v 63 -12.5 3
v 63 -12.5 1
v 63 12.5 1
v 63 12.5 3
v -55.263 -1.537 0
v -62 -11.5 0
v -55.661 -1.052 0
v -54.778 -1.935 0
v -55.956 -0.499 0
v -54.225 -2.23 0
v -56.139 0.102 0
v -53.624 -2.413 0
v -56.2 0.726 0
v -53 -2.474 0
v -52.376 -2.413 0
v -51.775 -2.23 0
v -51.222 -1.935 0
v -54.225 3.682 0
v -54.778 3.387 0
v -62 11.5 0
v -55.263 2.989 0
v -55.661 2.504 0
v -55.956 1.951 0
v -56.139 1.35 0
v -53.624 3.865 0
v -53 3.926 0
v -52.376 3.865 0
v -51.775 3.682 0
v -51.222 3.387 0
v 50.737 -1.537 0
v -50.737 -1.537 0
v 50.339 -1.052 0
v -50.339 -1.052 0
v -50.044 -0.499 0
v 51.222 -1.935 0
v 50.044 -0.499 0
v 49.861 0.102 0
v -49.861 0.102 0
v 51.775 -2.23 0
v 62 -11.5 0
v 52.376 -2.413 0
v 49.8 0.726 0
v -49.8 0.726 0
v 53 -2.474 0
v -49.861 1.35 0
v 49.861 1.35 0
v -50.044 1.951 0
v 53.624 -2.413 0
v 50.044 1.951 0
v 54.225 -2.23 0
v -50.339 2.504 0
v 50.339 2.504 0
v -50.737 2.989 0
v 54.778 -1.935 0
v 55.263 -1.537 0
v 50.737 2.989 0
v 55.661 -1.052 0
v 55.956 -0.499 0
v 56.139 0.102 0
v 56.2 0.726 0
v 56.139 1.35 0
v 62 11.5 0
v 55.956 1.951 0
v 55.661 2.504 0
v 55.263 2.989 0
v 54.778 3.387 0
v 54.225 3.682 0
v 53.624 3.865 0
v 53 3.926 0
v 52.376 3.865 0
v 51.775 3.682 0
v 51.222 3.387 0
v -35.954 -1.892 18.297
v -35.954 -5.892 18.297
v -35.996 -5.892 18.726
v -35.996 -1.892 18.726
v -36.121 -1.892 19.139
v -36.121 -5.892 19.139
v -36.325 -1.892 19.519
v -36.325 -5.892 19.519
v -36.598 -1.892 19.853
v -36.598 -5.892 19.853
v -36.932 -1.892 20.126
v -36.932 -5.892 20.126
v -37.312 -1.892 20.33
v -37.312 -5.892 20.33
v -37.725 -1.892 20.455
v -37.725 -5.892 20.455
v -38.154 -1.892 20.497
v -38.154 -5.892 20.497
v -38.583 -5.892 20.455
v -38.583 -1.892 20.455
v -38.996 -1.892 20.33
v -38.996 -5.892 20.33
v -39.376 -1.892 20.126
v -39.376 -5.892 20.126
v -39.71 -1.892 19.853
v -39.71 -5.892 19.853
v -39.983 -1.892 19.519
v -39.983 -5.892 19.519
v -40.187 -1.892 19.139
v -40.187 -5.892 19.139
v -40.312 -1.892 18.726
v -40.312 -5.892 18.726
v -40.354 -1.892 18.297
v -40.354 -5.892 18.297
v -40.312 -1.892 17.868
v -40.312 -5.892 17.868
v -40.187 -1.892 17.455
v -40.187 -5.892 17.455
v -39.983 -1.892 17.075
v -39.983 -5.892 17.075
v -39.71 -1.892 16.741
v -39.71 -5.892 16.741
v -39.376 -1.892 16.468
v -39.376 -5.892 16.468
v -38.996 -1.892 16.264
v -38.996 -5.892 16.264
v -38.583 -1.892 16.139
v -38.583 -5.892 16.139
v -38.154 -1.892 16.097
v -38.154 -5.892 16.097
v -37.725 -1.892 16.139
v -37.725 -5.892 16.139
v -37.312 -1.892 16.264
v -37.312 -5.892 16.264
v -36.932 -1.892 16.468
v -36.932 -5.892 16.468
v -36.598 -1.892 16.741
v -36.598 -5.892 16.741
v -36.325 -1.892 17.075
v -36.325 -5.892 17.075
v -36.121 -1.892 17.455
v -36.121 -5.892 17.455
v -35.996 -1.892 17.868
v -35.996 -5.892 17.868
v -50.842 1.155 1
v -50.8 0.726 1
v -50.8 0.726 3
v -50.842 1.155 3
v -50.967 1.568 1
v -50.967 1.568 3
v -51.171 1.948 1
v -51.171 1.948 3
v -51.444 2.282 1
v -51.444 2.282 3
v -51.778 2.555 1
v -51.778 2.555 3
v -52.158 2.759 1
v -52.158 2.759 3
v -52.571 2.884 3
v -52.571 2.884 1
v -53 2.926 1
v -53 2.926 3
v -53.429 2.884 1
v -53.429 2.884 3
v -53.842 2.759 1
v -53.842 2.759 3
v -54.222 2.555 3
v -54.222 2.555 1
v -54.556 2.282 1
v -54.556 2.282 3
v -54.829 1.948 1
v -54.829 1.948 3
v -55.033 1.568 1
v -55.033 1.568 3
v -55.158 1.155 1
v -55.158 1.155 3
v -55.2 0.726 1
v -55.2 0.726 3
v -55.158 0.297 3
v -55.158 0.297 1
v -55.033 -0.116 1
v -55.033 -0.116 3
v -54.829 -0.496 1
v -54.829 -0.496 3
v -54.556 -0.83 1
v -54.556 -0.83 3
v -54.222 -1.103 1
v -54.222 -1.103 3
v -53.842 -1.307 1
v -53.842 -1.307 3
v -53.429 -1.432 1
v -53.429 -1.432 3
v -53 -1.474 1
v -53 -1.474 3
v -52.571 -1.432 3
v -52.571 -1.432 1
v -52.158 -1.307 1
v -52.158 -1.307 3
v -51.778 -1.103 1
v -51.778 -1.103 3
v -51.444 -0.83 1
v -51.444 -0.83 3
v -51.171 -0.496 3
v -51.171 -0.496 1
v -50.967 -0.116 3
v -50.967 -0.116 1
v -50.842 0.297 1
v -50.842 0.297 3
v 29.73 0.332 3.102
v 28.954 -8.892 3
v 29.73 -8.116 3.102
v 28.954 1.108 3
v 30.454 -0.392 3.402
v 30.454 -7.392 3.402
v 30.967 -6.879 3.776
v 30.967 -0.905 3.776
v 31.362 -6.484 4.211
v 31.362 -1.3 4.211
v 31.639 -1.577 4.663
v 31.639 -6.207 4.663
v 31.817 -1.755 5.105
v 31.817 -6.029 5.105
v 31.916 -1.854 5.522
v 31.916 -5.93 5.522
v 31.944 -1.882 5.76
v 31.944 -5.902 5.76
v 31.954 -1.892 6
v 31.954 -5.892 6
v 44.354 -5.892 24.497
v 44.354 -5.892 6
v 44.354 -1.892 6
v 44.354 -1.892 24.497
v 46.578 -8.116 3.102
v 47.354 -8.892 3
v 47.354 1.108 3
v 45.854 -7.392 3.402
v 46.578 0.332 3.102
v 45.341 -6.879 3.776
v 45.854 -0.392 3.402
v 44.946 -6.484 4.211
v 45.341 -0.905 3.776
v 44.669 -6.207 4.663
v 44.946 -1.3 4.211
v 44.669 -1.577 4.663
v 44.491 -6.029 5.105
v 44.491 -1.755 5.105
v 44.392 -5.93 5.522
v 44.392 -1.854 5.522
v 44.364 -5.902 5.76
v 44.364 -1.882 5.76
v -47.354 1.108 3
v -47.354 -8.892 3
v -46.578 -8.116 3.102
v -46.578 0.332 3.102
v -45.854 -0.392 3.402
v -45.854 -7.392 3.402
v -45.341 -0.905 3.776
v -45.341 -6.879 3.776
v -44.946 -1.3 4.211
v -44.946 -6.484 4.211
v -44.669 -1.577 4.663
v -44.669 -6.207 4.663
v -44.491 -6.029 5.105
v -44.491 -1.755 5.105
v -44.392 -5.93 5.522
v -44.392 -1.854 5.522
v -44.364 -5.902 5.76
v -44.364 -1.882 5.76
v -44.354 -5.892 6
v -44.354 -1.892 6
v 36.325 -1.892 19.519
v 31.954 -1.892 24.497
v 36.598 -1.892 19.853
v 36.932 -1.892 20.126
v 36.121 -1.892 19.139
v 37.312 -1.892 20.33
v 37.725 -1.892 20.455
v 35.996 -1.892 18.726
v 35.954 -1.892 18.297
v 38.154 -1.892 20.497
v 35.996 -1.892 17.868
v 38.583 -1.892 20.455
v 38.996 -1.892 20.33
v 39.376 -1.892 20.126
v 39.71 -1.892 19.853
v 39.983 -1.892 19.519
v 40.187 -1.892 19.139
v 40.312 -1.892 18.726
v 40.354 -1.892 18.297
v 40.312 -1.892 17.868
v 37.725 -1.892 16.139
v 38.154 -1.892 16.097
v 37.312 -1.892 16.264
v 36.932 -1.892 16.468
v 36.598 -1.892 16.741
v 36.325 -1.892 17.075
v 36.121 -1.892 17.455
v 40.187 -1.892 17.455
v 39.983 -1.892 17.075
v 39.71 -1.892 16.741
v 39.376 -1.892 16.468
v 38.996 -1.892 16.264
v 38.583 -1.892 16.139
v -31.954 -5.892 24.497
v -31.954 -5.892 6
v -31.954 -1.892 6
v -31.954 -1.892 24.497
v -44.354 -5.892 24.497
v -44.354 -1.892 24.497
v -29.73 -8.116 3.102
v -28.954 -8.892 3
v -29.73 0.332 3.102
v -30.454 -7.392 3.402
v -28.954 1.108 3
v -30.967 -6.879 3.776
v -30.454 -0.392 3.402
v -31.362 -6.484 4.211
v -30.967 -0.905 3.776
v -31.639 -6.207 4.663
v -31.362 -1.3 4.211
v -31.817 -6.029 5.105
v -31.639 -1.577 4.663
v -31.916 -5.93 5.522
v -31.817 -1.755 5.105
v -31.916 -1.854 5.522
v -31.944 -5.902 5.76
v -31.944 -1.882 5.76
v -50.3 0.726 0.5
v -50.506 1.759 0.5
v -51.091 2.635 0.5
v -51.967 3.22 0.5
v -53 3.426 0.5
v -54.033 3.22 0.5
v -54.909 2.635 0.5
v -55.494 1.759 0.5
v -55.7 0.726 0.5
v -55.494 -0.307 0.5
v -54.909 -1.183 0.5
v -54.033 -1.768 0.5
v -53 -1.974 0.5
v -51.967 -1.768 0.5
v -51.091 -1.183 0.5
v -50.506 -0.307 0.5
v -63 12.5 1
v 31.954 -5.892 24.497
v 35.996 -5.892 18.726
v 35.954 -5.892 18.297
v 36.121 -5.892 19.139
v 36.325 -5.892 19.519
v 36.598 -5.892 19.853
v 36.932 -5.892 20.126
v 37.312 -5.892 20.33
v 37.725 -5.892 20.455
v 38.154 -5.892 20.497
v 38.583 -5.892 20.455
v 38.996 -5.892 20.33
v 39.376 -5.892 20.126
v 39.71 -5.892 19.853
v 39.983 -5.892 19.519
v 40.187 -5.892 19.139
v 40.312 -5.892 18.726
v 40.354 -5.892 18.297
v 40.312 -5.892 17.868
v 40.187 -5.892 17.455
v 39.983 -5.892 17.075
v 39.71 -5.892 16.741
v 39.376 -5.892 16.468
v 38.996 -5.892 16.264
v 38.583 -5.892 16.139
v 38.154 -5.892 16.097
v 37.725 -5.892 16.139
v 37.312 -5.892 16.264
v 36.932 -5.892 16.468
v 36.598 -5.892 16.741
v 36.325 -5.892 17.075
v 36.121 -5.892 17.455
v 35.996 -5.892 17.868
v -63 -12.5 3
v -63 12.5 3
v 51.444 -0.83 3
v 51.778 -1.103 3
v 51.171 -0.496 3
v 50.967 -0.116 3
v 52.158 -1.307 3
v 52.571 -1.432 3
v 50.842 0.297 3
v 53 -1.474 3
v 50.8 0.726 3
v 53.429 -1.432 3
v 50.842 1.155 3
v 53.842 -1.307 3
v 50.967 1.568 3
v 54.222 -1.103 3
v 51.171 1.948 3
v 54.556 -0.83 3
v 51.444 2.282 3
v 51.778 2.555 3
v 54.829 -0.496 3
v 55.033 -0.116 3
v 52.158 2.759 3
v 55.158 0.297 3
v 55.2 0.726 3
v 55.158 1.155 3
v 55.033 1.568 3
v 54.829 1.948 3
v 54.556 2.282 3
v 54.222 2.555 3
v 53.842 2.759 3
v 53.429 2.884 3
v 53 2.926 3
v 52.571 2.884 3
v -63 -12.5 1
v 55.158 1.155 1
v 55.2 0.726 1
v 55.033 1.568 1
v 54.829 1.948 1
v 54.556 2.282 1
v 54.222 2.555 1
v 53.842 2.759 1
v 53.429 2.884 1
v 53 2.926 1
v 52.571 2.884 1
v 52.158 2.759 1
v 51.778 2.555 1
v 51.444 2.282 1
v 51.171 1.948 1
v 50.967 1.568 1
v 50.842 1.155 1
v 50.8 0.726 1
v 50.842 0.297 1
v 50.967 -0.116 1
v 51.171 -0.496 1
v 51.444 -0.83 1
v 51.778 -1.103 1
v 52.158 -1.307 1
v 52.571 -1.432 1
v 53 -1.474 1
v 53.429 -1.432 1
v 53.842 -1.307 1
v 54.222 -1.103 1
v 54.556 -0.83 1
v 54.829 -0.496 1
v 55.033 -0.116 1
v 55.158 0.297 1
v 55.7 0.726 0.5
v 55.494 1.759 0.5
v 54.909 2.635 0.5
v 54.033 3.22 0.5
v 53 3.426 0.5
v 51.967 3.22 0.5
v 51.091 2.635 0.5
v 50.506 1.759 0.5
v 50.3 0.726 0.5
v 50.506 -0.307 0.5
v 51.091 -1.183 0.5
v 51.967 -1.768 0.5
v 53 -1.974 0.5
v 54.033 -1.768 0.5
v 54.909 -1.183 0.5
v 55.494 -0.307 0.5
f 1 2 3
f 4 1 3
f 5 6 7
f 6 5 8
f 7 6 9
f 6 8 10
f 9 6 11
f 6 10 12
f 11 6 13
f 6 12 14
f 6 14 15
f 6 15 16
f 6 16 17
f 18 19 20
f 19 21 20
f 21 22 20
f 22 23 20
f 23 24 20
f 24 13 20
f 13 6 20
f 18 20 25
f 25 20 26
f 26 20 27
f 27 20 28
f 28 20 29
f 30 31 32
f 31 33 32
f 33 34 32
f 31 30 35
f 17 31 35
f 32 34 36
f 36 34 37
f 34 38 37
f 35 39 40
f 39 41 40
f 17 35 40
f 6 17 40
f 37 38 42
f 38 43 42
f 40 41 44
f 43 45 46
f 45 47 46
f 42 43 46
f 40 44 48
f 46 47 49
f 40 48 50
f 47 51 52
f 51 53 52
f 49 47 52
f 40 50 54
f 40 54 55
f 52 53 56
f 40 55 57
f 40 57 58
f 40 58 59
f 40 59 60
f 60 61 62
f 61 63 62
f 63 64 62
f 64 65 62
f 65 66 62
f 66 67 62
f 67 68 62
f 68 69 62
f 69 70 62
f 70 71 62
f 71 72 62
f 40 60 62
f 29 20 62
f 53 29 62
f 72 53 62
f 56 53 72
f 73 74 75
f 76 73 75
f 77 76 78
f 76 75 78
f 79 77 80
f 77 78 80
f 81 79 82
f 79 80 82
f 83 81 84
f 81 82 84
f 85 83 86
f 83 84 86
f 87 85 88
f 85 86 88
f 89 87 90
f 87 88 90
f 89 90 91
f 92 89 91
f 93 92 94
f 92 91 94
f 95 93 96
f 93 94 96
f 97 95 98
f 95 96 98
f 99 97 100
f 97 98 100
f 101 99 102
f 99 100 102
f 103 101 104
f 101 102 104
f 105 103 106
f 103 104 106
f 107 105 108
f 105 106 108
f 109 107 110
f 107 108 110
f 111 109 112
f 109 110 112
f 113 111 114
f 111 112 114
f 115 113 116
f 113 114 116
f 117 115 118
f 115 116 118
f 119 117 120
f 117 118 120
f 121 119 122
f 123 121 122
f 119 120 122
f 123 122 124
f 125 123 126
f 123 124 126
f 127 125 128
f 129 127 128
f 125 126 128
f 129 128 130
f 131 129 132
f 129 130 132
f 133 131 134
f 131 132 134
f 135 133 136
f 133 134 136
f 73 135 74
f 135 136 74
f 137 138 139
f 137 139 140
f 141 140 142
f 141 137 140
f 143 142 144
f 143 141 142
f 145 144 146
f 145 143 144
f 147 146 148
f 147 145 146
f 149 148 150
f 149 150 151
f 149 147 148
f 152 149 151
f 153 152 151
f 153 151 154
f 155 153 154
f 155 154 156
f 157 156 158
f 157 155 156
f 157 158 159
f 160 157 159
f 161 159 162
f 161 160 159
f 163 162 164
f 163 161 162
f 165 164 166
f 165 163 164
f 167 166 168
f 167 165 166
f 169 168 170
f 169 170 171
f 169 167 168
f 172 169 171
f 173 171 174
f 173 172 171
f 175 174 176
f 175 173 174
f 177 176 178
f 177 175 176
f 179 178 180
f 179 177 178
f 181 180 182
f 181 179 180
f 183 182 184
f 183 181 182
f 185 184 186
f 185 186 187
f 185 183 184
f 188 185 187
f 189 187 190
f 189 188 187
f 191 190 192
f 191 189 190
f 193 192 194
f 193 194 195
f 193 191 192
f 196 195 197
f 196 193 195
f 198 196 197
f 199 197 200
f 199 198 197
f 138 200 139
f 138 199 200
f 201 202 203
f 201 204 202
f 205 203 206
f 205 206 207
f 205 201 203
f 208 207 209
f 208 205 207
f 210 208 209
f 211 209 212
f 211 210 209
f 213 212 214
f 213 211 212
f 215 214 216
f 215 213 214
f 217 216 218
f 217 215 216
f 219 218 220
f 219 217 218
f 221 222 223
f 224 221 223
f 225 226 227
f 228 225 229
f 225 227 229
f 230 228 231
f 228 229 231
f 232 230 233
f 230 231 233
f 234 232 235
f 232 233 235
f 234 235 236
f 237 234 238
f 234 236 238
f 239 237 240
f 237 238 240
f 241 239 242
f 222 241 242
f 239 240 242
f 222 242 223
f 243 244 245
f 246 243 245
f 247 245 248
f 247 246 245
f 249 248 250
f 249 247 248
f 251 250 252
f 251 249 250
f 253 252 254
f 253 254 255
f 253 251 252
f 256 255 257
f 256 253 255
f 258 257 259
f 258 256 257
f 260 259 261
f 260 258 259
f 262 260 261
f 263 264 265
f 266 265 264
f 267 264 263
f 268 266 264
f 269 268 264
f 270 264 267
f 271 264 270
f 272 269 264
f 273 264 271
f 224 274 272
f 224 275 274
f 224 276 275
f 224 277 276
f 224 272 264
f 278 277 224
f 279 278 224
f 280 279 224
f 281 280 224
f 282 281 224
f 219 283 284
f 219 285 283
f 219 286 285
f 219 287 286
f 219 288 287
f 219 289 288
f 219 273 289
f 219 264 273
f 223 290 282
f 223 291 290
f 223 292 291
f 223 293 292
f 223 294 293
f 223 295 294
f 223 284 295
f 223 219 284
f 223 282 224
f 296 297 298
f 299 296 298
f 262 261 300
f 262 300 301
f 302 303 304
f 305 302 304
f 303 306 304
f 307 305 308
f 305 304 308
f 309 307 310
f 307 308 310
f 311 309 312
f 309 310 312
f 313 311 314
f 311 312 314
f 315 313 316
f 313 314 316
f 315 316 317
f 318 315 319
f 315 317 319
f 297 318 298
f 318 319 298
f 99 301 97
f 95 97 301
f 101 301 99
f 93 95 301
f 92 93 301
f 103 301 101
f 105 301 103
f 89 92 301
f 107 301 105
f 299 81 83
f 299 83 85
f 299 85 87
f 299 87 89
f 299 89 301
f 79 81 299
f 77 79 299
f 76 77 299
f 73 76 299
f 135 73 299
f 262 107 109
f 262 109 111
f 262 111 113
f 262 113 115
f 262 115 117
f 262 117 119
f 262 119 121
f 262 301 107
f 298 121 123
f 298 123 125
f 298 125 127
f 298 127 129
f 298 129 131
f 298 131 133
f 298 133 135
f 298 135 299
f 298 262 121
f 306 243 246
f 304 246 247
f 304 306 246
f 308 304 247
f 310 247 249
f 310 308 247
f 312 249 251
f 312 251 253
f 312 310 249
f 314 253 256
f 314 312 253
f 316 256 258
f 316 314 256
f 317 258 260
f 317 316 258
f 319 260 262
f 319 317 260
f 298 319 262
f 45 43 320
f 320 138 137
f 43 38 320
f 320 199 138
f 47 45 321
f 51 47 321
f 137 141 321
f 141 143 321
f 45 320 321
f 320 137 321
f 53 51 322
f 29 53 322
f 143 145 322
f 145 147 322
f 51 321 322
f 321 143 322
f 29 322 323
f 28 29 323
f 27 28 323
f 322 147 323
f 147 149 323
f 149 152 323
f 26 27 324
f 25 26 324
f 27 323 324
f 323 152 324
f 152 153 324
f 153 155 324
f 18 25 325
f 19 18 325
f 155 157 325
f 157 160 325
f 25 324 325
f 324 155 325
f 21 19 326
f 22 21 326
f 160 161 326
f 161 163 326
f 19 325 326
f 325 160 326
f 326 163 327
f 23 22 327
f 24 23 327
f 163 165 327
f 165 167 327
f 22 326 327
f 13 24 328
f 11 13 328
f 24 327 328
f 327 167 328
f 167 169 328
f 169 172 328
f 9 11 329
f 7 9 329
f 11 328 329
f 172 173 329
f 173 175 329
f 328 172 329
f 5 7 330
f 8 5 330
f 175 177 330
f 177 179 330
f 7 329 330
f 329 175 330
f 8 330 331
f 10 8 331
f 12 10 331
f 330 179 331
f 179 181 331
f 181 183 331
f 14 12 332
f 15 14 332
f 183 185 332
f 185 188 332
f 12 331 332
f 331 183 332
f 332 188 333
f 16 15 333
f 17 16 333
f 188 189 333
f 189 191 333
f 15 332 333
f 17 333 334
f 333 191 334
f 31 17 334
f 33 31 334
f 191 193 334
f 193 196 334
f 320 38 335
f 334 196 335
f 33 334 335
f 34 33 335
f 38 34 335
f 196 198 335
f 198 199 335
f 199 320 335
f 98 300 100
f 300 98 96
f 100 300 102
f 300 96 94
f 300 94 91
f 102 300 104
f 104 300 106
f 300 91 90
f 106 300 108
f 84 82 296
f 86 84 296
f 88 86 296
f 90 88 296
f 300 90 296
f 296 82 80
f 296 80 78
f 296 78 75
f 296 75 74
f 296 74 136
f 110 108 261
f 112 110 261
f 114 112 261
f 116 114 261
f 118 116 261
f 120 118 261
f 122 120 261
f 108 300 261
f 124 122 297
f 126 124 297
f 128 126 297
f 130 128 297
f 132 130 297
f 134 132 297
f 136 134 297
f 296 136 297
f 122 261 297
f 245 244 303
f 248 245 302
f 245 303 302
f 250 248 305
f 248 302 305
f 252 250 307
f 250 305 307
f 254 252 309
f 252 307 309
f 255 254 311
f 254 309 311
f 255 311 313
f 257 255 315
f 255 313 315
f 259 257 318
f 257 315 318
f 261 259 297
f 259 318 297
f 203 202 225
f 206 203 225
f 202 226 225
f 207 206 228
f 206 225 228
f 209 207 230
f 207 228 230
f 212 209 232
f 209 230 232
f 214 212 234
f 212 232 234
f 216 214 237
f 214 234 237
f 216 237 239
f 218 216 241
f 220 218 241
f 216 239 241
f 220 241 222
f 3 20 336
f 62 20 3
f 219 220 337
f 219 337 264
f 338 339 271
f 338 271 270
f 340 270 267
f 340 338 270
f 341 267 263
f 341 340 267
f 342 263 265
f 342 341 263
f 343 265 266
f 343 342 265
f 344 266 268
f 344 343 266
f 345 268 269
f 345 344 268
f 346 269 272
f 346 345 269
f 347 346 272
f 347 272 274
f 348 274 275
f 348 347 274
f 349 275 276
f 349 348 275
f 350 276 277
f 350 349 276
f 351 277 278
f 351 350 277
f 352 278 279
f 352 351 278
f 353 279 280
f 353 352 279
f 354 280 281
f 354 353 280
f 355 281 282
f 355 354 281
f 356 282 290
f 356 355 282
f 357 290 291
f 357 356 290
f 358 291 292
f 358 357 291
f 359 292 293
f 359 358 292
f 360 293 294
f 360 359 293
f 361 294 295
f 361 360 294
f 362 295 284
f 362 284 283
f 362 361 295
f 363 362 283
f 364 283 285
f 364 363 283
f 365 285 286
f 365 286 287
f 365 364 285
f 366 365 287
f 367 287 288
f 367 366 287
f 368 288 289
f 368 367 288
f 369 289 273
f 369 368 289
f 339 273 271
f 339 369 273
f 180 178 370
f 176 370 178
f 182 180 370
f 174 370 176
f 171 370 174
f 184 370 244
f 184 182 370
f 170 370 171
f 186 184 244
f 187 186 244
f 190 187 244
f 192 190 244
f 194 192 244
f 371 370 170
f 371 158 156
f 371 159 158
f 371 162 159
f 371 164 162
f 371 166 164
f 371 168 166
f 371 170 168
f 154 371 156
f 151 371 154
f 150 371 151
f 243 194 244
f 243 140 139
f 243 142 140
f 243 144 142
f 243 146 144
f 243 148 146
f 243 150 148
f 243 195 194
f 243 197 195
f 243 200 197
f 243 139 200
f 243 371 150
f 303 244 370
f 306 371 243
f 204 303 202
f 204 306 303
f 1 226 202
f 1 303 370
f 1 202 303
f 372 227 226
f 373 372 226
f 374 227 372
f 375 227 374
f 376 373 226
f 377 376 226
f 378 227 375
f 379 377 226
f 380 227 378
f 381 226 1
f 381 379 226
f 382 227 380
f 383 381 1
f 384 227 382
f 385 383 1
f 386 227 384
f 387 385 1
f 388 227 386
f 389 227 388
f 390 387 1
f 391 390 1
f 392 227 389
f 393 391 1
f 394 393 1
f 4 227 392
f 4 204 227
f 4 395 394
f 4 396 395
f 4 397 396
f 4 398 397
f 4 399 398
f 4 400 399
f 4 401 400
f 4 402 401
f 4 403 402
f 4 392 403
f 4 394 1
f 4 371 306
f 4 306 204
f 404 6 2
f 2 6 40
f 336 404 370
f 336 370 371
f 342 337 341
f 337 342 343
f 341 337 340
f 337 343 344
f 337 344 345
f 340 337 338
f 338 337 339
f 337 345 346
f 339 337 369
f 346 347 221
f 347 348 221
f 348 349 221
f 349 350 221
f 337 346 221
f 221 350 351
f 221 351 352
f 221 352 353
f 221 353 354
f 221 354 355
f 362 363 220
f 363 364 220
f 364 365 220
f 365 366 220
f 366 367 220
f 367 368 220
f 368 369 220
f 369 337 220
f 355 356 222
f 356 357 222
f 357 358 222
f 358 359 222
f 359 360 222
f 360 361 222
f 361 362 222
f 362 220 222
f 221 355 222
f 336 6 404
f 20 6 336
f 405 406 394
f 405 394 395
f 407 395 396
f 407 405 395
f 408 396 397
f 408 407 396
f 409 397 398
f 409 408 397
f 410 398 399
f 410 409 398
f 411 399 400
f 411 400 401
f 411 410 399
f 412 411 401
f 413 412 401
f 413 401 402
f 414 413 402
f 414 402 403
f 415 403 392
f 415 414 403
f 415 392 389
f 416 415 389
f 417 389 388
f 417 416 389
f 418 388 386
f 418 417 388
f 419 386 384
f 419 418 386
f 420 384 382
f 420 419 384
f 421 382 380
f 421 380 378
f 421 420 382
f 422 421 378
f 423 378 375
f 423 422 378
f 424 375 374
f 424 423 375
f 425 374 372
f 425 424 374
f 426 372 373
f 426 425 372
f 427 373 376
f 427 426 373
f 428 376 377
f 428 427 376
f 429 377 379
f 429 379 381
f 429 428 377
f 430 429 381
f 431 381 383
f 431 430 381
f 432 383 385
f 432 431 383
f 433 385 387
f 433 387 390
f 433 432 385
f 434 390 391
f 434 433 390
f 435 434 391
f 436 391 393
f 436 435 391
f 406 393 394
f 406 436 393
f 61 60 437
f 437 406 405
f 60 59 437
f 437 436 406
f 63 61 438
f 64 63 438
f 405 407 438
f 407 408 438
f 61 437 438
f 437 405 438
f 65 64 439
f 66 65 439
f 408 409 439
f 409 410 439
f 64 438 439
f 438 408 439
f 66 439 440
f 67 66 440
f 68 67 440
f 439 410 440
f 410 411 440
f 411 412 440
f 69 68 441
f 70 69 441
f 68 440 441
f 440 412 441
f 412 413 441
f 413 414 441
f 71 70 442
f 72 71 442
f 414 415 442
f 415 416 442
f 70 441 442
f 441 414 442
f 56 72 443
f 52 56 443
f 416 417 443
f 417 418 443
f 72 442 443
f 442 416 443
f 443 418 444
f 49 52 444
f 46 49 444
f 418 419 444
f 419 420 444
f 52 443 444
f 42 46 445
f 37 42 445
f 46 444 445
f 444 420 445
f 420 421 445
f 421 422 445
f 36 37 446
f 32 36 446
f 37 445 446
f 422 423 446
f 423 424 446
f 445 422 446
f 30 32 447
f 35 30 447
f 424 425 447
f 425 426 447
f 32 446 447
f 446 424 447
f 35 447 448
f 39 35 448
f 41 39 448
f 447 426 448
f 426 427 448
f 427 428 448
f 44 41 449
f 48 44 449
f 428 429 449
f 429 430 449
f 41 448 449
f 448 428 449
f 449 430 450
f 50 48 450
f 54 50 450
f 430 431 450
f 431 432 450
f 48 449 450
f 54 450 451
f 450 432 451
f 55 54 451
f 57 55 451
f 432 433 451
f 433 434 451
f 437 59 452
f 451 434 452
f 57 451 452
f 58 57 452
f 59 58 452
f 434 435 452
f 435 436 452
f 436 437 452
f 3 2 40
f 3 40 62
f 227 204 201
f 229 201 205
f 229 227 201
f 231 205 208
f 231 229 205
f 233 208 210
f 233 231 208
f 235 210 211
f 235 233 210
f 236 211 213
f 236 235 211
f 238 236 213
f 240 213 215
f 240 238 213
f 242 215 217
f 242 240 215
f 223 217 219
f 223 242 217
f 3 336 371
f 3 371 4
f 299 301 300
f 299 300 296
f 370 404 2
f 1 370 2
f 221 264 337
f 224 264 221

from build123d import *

# Parameters (mm, degrees)
SKETCH_W     = 126
SKETCH_H     = 25
SKETCH_R     = 2.2
PAD_DEPTH    = 3
SKETCH001_W  = 12.4
SKETCH001_H  = 4
PAD001_DEPTH = 21.497
SKETCH002_R  = 2.2
POCKET_DEPTH = 4
CHAMFER_SIZE = 1
FILLET_R     = 3


with BuildPart() as part:
    # Sketch → Pad (new body)
    with BuildSketch(Plane.XY):
        Rectangle(SKETCH_W, SKETCH_H)
        with Locations((-53, 0.726)):
            Circle(SKETCH_R, mode=Mode.SUBTRACT)
        with Locations((53, 0.726)):
            Circle(SKETCH_R, mode=Mode.SUBTRACT)
    extrude(amount=PAD_DEPTH)

    # Sketch001 → Pad001 (new body)
    with BuildSketch(Plane.XY.offset(3)):
        with Locations((-38.154, -3.892)):
            Rectangle(SKETCH001_W, SKETCH001_H)
        with Locations((38.154, -3.892)):
            Rectangle(SKETCH001_W, SKETCH001_H)
    extrude(amount=PAD001_DEPTH)

    # Sketch002 → Pocket (cut)
    with BuildSketch(Plane.XZ.offset(5.892)):
        with Locations((-38.154, 18.297)):
            Circle(SKETCH002_R)
    pocket = extrude(amount=-POCKET_DEPTH, mode=Mode.SUBTRACT)

    # Mirrored: Pocket across Sketch002 V_Axis
    add(pocket.mirror(Plane(origin=(0, -5.892, 0), x_dir=(0, -1, 0), z_dir=(1, 0, 0))), mode=Mode.SUBTRACT)

    # Chamfer
    chamfer_edges = [part.edges().sort_by_distance(p)[0] for p in [
        (0, 12.5, 0),
        (63, 0, 0),
        (0, -12.5, 0),
        (-63, 0, 0),
        (50.8, 0.726, 0),
        (-55.2, 0.726, 0),
    ]]
    chamfer(chamfer_edges, length=CHAMFER_SIZE)

    # Fillet
    fillet_edges = [part.edges().sort_by_distance(p)[0] for p in [
        (38.154, -5.892, 3),
        (31.954, -3.892, 3),
        (38.154, -1.892, 3),
        (44.354, -3.892, 3),
        (-38.154, -5.892, 3),
        (-31.954, -3.892, 3),
        (-38.154, -1.892, 3),
        (-44.354, -3.892, 3),
    ]]
    fillet(fillet_edges, radius=FILLET_R)


solid = part.part
